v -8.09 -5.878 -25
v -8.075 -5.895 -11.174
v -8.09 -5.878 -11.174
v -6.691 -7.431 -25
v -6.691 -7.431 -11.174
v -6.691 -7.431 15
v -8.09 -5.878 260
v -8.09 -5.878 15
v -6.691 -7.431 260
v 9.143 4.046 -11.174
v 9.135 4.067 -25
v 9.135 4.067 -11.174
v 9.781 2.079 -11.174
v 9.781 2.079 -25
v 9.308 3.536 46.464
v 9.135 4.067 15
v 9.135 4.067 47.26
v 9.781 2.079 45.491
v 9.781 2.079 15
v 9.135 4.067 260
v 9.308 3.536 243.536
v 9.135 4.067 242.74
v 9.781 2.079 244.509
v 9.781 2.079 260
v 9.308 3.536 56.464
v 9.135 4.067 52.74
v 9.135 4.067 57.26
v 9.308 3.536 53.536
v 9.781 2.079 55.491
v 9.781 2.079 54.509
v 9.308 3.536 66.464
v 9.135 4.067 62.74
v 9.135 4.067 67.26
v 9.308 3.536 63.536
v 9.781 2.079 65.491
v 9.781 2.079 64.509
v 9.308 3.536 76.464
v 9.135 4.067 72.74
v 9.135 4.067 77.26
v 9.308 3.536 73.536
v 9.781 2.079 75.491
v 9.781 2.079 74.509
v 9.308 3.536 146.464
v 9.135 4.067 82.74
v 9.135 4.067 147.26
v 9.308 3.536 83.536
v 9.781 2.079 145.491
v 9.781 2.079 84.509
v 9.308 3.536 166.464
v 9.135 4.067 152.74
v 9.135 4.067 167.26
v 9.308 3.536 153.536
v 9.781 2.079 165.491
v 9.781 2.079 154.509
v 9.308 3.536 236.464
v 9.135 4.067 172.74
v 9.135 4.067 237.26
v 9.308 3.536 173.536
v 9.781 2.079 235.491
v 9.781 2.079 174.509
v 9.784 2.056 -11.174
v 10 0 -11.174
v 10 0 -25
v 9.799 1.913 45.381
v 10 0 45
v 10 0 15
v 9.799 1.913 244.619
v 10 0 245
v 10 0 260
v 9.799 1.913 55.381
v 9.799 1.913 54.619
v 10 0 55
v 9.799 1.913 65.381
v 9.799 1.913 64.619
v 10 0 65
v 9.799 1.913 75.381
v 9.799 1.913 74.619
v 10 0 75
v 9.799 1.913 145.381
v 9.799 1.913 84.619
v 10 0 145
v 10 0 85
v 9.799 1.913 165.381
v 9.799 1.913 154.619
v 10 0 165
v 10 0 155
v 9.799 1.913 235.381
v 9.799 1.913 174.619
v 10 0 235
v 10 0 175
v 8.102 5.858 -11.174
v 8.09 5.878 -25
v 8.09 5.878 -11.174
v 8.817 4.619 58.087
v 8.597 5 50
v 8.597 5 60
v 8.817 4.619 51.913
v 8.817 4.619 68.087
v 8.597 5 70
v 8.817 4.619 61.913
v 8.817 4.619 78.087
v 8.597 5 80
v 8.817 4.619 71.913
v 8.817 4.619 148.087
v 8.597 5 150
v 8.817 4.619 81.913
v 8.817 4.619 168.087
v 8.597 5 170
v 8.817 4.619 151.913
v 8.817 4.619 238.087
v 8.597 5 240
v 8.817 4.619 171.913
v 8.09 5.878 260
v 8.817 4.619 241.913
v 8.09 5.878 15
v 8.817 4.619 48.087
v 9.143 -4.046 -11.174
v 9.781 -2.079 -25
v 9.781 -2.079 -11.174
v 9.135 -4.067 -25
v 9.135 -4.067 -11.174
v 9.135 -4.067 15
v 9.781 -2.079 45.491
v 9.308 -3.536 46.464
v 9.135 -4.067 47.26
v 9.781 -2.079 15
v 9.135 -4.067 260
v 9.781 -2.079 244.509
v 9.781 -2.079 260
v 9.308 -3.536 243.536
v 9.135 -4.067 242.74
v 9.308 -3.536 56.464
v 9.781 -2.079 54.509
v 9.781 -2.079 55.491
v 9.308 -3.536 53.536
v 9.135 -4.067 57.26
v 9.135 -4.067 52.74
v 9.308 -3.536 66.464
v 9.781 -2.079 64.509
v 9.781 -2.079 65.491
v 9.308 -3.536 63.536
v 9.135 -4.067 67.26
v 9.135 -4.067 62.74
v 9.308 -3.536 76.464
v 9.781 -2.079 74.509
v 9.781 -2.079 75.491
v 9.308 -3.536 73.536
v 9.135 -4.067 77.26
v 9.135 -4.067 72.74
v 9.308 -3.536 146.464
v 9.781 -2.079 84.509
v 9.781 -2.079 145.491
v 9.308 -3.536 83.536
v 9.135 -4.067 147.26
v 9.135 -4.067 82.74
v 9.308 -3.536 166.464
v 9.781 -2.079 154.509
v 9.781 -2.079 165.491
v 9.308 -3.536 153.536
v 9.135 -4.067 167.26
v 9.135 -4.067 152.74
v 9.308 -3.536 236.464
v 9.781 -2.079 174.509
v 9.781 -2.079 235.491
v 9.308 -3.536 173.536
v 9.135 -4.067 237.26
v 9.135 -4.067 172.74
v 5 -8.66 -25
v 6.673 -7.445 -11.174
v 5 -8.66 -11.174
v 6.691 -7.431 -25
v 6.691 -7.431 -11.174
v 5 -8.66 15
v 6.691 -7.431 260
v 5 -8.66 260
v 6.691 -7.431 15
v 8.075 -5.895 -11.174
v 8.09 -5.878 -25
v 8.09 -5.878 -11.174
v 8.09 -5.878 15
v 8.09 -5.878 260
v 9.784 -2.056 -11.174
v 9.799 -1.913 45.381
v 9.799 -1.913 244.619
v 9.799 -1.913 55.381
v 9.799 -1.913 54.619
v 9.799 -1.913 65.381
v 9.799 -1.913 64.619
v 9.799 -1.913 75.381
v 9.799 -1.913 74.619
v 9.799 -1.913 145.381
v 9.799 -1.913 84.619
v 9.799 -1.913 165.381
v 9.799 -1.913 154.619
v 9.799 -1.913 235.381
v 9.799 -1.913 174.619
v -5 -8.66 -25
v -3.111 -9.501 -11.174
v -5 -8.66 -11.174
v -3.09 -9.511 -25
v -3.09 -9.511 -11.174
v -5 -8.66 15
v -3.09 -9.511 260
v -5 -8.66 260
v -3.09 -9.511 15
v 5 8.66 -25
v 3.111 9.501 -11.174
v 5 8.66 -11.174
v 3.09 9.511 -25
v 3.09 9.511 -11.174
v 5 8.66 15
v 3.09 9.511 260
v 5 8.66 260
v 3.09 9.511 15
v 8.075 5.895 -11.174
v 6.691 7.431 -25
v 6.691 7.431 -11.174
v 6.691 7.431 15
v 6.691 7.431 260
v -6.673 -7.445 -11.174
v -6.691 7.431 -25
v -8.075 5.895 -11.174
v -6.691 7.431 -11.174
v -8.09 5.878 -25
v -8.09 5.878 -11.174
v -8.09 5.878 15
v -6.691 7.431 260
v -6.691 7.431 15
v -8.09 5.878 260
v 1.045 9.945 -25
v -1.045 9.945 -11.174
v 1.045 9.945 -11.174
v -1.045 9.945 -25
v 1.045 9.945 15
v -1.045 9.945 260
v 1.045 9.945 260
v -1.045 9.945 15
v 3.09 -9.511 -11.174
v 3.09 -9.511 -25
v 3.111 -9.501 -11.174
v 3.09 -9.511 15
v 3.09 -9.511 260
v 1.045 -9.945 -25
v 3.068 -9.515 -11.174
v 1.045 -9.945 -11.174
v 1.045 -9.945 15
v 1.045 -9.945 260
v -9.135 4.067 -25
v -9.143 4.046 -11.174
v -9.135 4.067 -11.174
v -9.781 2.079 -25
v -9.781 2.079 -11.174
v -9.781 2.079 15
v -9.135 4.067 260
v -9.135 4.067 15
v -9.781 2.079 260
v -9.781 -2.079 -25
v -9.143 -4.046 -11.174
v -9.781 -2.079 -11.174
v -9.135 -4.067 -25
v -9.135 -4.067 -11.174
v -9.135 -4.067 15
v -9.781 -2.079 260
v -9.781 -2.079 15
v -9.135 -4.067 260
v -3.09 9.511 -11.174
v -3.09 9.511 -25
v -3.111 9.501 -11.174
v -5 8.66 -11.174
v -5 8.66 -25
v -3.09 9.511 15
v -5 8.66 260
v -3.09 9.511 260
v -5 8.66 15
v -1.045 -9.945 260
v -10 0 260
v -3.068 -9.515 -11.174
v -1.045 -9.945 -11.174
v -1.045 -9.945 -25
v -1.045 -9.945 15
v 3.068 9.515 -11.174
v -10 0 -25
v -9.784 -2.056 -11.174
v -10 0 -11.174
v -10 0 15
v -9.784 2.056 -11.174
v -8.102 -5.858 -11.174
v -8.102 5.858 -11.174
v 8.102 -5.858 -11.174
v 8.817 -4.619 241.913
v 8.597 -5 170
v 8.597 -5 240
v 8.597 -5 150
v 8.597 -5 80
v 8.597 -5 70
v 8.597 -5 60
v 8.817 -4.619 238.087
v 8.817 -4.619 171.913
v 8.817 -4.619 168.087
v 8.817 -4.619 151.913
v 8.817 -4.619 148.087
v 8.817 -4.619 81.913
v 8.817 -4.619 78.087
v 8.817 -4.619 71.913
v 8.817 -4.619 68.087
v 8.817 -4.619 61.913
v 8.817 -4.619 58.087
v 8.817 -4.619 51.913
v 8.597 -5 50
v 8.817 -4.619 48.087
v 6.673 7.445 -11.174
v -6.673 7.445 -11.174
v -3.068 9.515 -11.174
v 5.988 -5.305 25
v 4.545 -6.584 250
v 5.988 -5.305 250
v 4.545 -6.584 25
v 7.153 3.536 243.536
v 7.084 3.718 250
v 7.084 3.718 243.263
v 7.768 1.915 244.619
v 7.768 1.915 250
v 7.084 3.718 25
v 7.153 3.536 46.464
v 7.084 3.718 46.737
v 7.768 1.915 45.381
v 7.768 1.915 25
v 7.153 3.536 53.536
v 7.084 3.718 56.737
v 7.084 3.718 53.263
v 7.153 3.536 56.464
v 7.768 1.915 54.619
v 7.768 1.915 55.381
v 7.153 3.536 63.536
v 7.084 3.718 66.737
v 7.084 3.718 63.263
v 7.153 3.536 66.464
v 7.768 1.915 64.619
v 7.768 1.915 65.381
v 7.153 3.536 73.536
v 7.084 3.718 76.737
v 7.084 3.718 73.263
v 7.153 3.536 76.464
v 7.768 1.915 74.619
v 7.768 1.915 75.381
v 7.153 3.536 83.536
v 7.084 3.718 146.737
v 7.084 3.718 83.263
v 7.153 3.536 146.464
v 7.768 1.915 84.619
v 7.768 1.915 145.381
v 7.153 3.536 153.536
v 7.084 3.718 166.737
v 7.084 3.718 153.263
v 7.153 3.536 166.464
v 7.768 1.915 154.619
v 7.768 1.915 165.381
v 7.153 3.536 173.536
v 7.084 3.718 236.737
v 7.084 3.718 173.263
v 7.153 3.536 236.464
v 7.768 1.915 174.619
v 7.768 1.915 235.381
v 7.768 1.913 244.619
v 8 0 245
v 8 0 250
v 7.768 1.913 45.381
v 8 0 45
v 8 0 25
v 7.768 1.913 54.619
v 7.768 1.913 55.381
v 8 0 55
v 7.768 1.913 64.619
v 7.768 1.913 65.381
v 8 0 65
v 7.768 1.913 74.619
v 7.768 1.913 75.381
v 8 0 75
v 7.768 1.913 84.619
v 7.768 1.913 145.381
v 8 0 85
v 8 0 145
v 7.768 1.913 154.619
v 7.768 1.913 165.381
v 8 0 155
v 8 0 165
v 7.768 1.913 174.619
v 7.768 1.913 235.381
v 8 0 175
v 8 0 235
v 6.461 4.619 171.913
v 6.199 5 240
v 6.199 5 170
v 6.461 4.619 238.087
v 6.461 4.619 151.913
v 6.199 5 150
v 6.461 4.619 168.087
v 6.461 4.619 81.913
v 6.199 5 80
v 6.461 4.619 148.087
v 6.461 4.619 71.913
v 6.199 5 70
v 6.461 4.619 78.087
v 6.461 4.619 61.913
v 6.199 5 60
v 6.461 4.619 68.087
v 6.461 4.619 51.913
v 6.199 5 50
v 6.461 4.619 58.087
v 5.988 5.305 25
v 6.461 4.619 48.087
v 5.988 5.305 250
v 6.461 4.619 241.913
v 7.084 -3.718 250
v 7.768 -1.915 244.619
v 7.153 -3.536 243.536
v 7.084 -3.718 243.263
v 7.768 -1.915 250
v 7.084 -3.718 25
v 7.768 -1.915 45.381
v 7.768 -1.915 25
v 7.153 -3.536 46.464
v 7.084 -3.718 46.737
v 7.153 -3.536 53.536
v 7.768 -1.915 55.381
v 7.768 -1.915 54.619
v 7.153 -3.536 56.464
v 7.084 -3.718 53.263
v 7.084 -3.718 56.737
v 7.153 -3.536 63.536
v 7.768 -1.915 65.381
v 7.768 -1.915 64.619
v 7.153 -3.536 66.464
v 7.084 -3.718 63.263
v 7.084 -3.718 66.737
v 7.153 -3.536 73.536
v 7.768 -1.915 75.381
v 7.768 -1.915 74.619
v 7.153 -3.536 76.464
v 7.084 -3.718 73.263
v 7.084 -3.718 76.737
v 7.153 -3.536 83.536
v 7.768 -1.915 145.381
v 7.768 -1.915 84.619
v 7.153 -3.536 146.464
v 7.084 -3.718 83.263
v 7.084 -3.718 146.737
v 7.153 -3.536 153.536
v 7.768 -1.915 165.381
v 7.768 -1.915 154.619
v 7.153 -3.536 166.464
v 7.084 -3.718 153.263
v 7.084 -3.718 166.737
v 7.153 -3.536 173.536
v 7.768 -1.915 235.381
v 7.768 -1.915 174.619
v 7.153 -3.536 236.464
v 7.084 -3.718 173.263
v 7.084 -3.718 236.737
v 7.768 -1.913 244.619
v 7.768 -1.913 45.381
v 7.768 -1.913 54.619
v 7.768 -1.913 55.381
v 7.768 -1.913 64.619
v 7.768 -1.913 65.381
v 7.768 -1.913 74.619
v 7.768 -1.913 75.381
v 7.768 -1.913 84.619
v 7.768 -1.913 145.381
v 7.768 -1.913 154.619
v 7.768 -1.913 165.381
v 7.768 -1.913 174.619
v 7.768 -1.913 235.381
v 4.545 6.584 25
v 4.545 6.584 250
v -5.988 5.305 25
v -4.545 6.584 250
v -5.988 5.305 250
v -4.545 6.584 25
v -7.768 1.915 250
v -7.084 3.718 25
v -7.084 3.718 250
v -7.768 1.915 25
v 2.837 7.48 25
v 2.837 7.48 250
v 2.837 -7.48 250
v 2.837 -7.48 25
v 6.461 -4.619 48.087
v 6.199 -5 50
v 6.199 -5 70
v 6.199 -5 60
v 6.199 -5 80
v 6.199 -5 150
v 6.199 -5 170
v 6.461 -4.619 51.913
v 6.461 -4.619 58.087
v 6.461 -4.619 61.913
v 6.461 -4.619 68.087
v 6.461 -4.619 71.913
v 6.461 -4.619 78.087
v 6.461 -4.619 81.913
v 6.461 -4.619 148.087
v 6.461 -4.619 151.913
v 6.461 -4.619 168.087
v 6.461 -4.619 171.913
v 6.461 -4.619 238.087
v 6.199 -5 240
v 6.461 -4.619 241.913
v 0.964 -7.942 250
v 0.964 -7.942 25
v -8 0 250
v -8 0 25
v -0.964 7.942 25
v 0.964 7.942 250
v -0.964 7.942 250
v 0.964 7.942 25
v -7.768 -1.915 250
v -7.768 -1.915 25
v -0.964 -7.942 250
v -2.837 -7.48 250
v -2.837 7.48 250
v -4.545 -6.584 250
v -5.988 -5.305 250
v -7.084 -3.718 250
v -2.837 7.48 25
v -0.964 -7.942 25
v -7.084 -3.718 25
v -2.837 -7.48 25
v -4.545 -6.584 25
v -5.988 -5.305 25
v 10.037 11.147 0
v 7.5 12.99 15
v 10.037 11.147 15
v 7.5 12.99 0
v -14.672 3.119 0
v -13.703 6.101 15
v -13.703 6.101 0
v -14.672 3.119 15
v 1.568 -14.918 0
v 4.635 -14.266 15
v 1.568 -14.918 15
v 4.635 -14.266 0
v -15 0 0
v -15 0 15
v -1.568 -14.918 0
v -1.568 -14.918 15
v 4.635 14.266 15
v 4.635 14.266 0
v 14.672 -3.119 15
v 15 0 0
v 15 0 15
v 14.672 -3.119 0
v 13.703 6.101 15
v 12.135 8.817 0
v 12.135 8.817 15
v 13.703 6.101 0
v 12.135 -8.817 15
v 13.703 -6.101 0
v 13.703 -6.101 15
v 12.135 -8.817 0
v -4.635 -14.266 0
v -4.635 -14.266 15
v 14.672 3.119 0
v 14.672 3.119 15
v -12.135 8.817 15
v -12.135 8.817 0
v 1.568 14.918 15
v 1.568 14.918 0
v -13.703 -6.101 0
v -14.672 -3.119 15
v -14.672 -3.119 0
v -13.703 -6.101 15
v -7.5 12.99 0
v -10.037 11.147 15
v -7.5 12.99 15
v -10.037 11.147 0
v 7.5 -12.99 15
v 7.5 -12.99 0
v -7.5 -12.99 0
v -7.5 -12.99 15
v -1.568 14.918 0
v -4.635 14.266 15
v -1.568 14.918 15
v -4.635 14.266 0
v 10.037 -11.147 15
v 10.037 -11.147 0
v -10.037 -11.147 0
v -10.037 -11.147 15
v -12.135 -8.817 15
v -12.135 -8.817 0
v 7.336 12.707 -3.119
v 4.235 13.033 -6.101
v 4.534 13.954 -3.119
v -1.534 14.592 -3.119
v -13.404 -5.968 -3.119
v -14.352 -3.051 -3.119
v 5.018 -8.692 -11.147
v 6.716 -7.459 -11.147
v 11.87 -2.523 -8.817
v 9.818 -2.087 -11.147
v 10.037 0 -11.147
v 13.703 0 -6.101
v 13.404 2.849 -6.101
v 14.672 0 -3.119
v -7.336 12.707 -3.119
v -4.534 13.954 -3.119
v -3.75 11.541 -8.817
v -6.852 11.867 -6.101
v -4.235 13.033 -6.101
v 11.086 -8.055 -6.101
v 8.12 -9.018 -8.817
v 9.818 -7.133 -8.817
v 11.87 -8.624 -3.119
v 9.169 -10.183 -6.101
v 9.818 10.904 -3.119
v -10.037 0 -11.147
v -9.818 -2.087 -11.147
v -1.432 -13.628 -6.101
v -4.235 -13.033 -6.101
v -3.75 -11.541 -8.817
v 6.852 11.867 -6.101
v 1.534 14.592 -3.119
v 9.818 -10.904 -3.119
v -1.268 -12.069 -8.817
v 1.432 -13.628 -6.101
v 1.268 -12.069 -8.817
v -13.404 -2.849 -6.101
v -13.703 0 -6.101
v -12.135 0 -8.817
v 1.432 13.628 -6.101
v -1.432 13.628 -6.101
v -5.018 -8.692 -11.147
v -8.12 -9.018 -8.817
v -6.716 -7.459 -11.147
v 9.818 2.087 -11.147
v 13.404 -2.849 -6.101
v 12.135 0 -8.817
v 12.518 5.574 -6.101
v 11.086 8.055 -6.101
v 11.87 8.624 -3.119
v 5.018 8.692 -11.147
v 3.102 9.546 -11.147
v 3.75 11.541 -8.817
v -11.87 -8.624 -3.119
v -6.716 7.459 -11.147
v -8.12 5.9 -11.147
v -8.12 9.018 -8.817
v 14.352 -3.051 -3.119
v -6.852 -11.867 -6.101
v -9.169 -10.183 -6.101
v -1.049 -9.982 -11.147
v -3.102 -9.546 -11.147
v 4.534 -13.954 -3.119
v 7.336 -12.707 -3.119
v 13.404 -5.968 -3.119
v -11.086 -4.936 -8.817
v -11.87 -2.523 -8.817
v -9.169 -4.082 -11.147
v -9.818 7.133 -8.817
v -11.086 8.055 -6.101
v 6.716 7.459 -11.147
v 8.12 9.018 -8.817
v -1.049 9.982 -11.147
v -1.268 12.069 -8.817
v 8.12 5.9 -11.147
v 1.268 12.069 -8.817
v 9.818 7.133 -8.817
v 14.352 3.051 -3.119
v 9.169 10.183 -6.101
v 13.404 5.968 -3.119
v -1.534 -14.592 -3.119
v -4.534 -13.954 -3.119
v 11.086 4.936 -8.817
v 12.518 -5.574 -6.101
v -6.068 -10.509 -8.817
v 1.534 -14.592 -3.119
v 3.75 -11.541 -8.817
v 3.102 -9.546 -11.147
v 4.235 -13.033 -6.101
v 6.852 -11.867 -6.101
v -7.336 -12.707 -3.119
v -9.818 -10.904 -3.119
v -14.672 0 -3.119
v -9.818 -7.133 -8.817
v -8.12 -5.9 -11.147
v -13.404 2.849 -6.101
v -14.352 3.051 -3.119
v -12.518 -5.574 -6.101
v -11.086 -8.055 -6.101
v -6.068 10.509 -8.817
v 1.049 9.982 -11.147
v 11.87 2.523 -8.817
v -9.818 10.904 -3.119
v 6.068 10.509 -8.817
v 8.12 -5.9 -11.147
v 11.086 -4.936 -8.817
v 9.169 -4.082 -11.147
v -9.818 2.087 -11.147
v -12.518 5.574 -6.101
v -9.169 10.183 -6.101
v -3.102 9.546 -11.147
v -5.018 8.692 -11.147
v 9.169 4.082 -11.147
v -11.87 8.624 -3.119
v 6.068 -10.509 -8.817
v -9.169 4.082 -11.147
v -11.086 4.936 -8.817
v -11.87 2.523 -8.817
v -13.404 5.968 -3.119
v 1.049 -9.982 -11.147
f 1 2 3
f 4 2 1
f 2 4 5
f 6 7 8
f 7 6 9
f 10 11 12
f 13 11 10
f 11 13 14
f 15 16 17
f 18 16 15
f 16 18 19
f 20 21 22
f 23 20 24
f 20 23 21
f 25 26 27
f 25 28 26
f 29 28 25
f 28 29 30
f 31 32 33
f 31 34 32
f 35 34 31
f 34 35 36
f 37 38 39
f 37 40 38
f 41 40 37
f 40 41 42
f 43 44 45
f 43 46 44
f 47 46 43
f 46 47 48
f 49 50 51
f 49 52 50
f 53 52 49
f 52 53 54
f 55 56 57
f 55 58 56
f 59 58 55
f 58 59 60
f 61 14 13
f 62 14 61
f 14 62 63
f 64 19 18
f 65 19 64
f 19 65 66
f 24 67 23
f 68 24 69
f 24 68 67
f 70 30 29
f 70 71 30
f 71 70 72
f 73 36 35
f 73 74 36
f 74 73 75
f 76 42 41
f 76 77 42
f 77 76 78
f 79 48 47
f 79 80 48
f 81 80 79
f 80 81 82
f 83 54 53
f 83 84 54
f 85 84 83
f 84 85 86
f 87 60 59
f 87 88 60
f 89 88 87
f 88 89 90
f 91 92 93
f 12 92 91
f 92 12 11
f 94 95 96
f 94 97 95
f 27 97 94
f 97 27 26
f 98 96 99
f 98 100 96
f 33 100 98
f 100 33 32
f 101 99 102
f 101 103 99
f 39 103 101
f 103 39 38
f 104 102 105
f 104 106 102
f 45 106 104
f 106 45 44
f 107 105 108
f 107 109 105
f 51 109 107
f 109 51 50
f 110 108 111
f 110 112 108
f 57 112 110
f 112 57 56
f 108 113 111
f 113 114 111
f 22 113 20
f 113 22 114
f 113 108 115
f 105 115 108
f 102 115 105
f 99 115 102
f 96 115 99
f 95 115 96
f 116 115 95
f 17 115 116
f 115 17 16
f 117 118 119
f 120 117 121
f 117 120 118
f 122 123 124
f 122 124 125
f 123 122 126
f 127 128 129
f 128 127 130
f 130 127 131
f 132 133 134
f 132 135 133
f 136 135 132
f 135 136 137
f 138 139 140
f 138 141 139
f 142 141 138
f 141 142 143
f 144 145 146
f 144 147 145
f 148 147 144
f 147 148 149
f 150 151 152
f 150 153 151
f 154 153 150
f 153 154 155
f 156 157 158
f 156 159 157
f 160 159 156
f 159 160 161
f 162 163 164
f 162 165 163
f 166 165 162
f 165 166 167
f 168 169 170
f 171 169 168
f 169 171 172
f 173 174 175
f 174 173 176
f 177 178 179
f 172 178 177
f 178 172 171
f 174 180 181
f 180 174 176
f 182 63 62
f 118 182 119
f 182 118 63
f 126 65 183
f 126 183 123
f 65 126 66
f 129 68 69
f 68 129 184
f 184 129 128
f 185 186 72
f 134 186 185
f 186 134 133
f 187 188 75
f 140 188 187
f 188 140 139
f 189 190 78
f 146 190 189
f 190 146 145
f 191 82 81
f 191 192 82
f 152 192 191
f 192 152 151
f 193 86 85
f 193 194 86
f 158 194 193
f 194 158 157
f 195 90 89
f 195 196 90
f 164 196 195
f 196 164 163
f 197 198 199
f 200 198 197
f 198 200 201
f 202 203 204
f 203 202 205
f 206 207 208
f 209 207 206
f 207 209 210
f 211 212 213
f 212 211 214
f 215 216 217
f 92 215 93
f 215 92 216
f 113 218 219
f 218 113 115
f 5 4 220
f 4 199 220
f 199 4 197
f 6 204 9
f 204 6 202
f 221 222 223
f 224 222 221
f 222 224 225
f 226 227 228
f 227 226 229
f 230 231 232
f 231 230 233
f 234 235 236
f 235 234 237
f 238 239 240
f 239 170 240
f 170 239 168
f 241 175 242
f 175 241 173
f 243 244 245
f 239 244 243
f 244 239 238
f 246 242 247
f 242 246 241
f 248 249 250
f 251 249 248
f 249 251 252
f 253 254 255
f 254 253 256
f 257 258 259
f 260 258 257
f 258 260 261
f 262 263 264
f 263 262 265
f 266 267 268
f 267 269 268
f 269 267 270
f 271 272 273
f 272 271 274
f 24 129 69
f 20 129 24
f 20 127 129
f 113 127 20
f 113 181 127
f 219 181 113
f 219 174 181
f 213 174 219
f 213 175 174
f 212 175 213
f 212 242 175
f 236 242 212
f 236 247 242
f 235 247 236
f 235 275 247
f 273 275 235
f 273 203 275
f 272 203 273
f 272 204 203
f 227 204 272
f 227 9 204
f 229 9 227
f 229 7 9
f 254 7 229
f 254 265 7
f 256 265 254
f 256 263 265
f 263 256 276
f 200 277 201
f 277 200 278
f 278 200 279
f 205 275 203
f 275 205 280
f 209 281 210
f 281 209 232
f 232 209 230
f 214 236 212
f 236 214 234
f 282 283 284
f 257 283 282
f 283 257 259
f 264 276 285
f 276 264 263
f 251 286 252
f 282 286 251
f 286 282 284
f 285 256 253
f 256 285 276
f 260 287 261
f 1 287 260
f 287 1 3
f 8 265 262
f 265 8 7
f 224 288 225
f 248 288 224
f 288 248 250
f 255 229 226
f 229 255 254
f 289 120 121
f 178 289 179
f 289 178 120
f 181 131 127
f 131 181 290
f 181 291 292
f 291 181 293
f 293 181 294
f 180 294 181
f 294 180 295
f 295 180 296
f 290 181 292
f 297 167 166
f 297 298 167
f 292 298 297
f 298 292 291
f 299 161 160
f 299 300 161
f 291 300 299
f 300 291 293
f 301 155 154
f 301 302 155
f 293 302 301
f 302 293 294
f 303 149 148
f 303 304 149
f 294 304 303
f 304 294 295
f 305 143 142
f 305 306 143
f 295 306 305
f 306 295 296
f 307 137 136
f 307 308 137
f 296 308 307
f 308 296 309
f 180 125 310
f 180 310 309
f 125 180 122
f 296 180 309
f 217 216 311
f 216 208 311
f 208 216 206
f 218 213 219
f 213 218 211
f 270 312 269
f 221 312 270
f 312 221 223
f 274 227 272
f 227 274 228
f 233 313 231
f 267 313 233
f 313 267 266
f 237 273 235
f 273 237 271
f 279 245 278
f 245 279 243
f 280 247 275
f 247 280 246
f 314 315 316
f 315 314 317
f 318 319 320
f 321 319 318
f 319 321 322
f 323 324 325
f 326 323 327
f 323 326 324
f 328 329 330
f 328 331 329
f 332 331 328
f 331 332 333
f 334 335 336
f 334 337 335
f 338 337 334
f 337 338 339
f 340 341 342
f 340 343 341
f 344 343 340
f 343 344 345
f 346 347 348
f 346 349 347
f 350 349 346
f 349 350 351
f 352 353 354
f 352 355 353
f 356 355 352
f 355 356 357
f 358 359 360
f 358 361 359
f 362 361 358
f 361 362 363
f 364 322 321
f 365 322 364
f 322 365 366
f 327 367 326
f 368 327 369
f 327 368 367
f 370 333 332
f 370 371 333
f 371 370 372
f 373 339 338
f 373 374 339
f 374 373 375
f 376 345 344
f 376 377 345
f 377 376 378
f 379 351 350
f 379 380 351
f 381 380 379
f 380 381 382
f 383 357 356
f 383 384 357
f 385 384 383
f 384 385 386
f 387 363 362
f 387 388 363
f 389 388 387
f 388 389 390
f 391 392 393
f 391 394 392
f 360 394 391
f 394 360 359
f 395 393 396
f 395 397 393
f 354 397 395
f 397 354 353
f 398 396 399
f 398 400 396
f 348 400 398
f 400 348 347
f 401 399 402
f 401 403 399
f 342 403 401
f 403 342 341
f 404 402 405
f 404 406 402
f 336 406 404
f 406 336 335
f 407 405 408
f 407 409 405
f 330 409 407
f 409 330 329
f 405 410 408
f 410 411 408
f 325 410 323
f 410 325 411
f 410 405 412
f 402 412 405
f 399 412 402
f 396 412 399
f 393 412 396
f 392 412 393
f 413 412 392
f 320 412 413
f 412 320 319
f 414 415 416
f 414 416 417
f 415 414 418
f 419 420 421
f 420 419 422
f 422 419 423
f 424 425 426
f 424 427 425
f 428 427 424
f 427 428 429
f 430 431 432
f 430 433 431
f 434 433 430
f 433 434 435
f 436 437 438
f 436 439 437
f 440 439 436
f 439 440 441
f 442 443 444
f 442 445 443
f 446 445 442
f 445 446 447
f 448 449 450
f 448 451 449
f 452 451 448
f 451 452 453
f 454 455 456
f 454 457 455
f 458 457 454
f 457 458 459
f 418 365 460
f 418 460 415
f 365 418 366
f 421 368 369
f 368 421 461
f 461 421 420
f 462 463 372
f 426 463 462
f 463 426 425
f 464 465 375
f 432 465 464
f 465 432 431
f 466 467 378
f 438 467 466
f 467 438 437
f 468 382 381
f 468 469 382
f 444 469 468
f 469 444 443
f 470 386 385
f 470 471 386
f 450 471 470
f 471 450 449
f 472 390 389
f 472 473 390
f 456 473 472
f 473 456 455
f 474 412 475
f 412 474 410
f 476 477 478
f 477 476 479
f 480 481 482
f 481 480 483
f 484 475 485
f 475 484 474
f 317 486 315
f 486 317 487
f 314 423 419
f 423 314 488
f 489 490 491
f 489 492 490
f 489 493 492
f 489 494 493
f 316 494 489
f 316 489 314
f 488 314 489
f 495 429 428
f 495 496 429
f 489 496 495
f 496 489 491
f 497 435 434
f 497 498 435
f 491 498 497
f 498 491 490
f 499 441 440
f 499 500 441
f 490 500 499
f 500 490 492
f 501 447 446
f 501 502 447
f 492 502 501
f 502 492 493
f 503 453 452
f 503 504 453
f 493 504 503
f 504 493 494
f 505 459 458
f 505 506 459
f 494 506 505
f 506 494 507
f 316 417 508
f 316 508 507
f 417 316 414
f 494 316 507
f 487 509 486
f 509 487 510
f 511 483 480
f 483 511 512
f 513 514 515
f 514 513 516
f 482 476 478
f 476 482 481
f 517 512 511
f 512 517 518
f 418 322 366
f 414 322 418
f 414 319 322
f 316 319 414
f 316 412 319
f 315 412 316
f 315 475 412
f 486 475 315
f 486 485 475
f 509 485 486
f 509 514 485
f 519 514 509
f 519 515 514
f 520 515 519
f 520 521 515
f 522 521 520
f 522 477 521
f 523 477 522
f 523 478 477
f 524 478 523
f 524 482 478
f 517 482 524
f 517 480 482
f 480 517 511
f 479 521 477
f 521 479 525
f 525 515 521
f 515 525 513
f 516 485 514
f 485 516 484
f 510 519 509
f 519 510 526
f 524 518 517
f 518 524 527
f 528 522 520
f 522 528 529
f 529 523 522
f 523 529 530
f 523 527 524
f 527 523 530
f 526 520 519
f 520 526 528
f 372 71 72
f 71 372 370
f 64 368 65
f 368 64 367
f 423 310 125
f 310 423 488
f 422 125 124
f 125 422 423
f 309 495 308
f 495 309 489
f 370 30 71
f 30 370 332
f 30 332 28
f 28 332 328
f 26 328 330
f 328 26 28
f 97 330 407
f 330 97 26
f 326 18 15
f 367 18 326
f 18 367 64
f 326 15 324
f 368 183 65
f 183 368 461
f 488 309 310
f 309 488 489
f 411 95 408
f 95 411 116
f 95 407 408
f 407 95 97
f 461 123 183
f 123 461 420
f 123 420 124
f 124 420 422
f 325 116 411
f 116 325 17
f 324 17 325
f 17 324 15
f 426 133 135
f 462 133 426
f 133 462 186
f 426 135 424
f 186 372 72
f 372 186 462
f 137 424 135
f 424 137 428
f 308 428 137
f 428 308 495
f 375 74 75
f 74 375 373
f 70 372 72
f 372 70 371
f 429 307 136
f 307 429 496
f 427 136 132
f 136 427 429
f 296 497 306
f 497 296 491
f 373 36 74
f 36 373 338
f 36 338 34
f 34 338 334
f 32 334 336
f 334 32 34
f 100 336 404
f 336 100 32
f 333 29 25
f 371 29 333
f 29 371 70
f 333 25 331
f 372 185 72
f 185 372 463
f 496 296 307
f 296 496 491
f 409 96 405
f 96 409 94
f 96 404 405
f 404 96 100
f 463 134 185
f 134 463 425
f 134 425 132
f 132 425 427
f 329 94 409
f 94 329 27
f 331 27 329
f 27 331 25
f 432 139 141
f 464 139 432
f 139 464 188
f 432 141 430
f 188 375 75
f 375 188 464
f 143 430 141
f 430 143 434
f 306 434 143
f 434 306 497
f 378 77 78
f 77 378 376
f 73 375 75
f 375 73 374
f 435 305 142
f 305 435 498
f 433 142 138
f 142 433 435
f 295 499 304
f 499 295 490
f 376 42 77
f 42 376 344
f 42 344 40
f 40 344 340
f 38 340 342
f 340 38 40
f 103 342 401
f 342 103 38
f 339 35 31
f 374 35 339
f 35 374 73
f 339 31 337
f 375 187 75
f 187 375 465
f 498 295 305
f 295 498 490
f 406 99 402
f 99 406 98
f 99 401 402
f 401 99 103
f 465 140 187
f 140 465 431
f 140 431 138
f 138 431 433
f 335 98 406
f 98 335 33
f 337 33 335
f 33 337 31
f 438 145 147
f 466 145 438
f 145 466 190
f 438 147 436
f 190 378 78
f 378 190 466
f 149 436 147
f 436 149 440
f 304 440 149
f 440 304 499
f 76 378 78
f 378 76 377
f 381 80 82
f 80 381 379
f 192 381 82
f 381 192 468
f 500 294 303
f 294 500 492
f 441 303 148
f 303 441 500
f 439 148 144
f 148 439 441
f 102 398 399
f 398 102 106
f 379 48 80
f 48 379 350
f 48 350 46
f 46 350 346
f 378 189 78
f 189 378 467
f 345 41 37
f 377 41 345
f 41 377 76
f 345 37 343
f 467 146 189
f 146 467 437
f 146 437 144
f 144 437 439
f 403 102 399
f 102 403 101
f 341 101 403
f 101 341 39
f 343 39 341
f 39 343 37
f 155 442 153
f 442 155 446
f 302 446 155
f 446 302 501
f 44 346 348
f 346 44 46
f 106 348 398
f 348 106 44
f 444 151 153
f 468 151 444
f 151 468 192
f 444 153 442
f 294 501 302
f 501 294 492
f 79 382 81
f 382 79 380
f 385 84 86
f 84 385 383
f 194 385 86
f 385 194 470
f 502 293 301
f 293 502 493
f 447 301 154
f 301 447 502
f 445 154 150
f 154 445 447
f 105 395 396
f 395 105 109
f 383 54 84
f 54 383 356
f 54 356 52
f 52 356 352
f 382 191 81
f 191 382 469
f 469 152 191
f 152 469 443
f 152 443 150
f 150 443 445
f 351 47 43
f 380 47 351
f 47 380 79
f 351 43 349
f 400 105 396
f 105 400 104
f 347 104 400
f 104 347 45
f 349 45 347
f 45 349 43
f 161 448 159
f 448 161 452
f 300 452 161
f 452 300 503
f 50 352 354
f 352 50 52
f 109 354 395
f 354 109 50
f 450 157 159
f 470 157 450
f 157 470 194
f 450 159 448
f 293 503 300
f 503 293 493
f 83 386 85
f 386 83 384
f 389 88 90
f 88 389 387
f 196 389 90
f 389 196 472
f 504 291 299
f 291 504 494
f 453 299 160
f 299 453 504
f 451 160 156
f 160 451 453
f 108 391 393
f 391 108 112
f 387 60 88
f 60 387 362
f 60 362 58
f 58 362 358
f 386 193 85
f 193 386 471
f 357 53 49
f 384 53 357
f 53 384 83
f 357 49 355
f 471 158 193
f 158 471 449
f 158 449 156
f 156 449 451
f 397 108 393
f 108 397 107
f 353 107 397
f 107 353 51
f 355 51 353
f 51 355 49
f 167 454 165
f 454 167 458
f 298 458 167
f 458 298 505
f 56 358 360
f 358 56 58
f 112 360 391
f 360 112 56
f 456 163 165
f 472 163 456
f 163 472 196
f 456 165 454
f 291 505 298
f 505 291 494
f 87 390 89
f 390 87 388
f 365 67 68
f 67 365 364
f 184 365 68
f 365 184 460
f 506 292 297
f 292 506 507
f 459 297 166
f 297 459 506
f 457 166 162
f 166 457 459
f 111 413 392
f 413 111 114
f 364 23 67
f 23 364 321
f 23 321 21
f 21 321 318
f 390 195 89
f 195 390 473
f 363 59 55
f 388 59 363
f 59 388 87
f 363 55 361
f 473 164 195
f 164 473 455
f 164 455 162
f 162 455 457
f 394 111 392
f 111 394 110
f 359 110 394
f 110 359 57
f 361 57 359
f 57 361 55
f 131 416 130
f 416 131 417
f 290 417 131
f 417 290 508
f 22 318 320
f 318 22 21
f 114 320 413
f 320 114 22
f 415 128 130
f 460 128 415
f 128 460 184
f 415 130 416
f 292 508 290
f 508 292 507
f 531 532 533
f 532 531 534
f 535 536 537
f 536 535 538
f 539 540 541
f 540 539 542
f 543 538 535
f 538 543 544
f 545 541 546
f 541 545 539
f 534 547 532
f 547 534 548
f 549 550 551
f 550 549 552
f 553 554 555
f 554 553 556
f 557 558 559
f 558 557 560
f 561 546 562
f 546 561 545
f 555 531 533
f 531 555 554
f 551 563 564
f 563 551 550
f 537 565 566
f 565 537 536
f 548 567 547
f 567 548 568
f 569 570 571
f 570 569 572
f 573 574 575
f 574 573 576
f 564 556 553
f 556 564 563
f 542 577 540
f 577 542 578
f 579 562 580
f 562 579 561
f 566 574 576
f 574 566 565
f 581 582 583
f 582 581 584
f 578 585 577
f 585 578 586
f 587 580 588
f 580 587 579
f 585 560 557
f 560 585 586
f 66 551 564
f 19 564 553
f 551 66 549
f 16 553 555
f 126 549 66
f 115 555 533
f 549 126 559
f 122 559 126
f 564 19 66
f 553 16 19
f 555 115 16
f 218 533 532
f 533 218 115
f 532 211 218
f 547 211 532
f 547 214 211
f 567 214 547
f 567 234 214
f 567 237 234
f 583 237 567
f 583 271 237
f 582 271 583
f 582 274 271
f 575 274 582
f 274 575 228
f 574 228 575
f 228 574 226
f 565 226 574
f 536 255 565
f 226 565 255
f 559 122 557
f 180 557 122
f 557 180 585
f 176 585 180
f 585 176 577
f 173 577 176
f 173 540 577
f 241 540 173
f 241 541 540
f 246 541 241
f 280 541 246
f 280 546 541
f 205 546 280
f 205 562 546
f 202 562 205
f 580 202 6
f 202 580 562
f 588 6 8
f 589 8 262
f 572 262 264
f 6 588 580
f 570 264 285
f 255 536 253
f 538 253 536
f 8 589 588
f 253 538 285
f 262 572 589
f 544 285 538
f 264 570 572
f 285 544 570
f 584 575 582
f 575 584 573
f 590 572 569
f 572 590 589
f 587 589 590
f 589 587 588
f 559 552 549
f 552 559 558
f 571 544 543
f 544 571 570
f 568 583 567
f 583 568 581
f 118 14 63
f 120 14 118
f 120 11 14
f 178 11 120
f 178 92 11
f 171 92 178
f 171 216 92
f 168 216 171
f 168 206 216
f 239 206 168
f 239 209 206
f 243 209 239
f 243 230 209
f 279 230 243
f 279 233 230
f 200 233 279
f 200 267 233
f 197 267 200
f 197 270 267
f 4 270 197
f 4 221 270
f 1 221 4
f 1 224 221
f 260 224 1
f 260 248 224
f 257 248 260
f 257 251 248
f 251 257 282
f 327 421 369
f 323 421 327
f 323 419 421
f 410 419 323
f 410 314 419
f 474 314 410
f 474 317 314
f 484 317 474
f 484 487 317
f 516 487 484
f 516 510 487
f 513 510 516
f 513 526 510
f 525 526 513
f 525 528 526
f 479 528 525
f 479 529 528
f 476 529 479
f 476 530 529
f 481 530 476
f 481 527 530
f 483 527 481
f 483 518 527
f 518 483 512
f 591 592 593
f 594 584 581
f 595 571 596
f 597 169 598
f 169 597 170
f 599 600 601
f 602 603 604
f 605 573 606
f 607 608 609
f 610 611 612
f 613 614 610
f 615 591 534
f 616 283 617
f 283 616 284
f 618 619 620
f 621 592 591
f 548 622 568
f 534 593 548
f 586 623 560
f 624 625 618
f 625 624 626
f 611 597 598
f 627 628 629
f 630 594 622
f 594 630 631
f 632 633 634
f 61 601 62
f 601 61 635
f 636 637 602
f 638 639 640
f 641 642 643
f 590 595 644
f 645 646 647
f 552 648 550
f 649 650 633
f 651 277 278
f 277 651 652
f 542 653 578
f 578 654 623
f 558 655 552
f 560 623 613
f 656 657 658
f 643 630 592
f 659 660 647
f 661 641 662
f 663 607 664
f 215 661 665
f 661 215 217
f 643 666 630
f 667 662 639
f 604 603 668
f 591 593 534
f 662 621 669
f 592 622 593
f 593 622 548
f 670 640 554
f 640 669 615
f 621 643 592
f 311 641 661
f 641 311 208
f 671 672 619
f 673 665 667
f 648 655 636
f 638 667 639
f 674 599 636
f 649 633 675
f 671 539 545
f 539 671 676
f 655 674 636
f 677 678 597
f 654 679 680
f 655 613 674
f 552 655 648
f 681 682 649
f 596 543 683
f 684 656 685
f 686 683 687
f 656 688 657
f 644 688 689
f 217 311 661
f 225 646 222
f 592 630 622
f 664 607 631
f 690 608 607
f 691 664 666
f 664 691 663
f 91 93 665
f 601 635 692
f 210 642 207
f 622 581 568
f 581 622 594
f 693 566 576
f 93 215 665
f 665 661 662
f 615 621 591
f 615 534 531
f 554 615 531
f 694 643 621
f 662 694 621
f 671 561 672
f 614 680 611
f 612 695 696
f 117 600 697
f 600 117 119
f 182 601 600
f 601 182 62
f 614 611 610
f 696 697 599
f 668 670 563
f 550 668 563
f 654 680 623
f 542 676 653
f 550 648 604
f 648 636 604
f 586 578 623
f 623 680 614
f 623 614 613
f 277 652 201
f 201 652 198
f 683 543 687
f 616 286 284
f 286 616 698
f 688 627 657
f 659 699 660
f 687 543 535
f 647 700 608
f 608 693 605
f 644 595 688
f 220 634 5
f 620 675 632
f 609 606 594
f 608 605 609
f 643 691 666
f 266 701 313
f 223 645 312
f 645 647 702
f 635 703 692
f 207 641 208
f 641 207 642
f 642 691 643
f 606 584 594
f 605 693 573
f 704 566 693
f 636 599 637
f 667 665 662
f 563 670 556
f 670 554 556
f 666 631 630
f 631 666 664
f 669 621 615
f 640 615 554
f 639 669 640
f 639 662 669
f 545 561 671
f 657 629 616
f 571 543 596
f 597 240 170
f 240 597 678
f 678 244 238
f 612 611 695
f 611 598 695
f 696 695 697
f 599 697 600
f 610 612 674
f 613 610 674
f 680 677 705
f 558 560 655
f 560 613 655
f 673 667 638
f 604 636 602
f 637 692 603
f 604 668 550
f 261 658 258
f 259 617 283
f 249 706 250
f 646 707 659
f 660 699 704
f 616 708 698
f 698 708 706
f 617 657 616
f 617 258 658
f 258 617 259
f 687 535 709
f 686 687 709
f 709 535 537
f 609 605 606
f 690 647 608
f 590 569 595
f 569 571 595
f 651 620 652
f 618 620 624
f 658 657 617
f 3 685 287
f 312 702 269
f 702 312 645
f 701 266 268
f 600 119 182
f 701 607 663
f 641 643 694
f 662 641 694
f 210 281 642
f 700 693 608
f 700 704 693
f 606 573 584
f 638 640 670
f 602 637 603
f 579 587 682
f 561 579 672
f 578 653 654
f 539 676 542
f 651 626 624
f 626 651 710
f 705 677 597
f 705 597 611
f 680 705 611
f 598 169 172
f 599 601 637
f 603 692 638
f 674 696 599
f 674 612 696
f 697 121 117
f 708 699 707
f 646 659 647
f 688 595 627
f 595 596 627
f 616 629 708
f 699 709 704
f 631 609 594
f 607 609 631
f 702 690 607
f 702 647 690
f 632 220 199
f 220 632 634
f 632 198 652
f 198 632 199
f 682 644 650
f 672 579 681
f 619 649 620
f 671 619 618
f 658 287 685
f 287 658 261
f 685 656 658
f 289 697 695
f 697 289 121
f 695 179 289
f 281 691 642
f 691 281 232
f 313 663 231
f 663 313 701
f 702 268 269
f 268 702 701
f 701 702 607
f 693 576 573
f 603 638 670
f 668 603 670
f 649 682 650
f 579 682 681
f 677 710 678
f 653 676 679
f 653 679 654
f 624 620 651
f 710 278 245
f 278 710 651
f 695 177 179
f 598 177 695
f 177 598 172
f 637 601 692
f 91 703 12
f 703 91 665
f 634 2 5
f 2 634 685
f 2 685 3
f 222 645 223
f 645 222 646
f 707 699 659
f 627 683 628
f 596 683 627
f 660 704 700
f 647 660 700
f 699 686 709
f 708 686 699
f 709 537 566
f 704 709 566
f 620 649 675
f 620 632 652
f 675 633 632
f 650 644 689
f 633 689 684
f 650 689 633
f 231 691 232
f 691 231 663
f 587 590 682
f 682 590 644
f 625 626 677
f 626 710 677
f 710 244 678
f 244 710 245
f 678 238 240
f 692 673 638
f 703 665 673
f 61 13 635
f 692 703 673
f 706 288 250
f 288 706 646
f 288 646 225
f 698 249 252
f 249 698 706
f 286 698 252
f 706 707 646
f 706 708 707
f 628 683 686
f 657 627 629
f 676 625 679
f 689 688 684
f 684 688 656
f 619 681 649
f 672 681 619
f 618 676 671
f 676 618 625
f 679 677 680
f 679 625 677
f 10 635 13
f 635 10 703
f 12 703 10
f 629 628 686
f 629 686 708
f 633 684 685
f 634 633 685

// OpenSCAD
difference () {
cylinder (260,10,10) ;
#translate ([0,0,0]) cylinder (250,8,8) ;
rotate ([0,90,0]) translate ([-20,0,6]) cylinder (5,5,5) ;
rotate ([0,90,0]) translate ([-50,0,6]) cylinder (5,5,5) ;
rotate ([0,90,0]) translate ([-60,0,6]) cylinder (5,5,5) ;
rotate ([0,90,0]) translate ([-70,0,6]) cylinder (5,5,5) ;
rotate ([0,90,0]) translate ([-80,0,6]) cylinder (5,5,5) ;
rotate ([0,90,0]) translate ([-150,0,6]) cylinder (5,5,5) ;
rotate ([0,90,0]) translate ([-170,0,6]) cylinder (5,5,5) ;
rotate ([0,90,0]) translate ([-240,0,6]) cylinder (5,5,5) ;
}
cylinder(15,15,15);
translate([0,0,-25])cylinder(50,10,10);
sphere(15);
